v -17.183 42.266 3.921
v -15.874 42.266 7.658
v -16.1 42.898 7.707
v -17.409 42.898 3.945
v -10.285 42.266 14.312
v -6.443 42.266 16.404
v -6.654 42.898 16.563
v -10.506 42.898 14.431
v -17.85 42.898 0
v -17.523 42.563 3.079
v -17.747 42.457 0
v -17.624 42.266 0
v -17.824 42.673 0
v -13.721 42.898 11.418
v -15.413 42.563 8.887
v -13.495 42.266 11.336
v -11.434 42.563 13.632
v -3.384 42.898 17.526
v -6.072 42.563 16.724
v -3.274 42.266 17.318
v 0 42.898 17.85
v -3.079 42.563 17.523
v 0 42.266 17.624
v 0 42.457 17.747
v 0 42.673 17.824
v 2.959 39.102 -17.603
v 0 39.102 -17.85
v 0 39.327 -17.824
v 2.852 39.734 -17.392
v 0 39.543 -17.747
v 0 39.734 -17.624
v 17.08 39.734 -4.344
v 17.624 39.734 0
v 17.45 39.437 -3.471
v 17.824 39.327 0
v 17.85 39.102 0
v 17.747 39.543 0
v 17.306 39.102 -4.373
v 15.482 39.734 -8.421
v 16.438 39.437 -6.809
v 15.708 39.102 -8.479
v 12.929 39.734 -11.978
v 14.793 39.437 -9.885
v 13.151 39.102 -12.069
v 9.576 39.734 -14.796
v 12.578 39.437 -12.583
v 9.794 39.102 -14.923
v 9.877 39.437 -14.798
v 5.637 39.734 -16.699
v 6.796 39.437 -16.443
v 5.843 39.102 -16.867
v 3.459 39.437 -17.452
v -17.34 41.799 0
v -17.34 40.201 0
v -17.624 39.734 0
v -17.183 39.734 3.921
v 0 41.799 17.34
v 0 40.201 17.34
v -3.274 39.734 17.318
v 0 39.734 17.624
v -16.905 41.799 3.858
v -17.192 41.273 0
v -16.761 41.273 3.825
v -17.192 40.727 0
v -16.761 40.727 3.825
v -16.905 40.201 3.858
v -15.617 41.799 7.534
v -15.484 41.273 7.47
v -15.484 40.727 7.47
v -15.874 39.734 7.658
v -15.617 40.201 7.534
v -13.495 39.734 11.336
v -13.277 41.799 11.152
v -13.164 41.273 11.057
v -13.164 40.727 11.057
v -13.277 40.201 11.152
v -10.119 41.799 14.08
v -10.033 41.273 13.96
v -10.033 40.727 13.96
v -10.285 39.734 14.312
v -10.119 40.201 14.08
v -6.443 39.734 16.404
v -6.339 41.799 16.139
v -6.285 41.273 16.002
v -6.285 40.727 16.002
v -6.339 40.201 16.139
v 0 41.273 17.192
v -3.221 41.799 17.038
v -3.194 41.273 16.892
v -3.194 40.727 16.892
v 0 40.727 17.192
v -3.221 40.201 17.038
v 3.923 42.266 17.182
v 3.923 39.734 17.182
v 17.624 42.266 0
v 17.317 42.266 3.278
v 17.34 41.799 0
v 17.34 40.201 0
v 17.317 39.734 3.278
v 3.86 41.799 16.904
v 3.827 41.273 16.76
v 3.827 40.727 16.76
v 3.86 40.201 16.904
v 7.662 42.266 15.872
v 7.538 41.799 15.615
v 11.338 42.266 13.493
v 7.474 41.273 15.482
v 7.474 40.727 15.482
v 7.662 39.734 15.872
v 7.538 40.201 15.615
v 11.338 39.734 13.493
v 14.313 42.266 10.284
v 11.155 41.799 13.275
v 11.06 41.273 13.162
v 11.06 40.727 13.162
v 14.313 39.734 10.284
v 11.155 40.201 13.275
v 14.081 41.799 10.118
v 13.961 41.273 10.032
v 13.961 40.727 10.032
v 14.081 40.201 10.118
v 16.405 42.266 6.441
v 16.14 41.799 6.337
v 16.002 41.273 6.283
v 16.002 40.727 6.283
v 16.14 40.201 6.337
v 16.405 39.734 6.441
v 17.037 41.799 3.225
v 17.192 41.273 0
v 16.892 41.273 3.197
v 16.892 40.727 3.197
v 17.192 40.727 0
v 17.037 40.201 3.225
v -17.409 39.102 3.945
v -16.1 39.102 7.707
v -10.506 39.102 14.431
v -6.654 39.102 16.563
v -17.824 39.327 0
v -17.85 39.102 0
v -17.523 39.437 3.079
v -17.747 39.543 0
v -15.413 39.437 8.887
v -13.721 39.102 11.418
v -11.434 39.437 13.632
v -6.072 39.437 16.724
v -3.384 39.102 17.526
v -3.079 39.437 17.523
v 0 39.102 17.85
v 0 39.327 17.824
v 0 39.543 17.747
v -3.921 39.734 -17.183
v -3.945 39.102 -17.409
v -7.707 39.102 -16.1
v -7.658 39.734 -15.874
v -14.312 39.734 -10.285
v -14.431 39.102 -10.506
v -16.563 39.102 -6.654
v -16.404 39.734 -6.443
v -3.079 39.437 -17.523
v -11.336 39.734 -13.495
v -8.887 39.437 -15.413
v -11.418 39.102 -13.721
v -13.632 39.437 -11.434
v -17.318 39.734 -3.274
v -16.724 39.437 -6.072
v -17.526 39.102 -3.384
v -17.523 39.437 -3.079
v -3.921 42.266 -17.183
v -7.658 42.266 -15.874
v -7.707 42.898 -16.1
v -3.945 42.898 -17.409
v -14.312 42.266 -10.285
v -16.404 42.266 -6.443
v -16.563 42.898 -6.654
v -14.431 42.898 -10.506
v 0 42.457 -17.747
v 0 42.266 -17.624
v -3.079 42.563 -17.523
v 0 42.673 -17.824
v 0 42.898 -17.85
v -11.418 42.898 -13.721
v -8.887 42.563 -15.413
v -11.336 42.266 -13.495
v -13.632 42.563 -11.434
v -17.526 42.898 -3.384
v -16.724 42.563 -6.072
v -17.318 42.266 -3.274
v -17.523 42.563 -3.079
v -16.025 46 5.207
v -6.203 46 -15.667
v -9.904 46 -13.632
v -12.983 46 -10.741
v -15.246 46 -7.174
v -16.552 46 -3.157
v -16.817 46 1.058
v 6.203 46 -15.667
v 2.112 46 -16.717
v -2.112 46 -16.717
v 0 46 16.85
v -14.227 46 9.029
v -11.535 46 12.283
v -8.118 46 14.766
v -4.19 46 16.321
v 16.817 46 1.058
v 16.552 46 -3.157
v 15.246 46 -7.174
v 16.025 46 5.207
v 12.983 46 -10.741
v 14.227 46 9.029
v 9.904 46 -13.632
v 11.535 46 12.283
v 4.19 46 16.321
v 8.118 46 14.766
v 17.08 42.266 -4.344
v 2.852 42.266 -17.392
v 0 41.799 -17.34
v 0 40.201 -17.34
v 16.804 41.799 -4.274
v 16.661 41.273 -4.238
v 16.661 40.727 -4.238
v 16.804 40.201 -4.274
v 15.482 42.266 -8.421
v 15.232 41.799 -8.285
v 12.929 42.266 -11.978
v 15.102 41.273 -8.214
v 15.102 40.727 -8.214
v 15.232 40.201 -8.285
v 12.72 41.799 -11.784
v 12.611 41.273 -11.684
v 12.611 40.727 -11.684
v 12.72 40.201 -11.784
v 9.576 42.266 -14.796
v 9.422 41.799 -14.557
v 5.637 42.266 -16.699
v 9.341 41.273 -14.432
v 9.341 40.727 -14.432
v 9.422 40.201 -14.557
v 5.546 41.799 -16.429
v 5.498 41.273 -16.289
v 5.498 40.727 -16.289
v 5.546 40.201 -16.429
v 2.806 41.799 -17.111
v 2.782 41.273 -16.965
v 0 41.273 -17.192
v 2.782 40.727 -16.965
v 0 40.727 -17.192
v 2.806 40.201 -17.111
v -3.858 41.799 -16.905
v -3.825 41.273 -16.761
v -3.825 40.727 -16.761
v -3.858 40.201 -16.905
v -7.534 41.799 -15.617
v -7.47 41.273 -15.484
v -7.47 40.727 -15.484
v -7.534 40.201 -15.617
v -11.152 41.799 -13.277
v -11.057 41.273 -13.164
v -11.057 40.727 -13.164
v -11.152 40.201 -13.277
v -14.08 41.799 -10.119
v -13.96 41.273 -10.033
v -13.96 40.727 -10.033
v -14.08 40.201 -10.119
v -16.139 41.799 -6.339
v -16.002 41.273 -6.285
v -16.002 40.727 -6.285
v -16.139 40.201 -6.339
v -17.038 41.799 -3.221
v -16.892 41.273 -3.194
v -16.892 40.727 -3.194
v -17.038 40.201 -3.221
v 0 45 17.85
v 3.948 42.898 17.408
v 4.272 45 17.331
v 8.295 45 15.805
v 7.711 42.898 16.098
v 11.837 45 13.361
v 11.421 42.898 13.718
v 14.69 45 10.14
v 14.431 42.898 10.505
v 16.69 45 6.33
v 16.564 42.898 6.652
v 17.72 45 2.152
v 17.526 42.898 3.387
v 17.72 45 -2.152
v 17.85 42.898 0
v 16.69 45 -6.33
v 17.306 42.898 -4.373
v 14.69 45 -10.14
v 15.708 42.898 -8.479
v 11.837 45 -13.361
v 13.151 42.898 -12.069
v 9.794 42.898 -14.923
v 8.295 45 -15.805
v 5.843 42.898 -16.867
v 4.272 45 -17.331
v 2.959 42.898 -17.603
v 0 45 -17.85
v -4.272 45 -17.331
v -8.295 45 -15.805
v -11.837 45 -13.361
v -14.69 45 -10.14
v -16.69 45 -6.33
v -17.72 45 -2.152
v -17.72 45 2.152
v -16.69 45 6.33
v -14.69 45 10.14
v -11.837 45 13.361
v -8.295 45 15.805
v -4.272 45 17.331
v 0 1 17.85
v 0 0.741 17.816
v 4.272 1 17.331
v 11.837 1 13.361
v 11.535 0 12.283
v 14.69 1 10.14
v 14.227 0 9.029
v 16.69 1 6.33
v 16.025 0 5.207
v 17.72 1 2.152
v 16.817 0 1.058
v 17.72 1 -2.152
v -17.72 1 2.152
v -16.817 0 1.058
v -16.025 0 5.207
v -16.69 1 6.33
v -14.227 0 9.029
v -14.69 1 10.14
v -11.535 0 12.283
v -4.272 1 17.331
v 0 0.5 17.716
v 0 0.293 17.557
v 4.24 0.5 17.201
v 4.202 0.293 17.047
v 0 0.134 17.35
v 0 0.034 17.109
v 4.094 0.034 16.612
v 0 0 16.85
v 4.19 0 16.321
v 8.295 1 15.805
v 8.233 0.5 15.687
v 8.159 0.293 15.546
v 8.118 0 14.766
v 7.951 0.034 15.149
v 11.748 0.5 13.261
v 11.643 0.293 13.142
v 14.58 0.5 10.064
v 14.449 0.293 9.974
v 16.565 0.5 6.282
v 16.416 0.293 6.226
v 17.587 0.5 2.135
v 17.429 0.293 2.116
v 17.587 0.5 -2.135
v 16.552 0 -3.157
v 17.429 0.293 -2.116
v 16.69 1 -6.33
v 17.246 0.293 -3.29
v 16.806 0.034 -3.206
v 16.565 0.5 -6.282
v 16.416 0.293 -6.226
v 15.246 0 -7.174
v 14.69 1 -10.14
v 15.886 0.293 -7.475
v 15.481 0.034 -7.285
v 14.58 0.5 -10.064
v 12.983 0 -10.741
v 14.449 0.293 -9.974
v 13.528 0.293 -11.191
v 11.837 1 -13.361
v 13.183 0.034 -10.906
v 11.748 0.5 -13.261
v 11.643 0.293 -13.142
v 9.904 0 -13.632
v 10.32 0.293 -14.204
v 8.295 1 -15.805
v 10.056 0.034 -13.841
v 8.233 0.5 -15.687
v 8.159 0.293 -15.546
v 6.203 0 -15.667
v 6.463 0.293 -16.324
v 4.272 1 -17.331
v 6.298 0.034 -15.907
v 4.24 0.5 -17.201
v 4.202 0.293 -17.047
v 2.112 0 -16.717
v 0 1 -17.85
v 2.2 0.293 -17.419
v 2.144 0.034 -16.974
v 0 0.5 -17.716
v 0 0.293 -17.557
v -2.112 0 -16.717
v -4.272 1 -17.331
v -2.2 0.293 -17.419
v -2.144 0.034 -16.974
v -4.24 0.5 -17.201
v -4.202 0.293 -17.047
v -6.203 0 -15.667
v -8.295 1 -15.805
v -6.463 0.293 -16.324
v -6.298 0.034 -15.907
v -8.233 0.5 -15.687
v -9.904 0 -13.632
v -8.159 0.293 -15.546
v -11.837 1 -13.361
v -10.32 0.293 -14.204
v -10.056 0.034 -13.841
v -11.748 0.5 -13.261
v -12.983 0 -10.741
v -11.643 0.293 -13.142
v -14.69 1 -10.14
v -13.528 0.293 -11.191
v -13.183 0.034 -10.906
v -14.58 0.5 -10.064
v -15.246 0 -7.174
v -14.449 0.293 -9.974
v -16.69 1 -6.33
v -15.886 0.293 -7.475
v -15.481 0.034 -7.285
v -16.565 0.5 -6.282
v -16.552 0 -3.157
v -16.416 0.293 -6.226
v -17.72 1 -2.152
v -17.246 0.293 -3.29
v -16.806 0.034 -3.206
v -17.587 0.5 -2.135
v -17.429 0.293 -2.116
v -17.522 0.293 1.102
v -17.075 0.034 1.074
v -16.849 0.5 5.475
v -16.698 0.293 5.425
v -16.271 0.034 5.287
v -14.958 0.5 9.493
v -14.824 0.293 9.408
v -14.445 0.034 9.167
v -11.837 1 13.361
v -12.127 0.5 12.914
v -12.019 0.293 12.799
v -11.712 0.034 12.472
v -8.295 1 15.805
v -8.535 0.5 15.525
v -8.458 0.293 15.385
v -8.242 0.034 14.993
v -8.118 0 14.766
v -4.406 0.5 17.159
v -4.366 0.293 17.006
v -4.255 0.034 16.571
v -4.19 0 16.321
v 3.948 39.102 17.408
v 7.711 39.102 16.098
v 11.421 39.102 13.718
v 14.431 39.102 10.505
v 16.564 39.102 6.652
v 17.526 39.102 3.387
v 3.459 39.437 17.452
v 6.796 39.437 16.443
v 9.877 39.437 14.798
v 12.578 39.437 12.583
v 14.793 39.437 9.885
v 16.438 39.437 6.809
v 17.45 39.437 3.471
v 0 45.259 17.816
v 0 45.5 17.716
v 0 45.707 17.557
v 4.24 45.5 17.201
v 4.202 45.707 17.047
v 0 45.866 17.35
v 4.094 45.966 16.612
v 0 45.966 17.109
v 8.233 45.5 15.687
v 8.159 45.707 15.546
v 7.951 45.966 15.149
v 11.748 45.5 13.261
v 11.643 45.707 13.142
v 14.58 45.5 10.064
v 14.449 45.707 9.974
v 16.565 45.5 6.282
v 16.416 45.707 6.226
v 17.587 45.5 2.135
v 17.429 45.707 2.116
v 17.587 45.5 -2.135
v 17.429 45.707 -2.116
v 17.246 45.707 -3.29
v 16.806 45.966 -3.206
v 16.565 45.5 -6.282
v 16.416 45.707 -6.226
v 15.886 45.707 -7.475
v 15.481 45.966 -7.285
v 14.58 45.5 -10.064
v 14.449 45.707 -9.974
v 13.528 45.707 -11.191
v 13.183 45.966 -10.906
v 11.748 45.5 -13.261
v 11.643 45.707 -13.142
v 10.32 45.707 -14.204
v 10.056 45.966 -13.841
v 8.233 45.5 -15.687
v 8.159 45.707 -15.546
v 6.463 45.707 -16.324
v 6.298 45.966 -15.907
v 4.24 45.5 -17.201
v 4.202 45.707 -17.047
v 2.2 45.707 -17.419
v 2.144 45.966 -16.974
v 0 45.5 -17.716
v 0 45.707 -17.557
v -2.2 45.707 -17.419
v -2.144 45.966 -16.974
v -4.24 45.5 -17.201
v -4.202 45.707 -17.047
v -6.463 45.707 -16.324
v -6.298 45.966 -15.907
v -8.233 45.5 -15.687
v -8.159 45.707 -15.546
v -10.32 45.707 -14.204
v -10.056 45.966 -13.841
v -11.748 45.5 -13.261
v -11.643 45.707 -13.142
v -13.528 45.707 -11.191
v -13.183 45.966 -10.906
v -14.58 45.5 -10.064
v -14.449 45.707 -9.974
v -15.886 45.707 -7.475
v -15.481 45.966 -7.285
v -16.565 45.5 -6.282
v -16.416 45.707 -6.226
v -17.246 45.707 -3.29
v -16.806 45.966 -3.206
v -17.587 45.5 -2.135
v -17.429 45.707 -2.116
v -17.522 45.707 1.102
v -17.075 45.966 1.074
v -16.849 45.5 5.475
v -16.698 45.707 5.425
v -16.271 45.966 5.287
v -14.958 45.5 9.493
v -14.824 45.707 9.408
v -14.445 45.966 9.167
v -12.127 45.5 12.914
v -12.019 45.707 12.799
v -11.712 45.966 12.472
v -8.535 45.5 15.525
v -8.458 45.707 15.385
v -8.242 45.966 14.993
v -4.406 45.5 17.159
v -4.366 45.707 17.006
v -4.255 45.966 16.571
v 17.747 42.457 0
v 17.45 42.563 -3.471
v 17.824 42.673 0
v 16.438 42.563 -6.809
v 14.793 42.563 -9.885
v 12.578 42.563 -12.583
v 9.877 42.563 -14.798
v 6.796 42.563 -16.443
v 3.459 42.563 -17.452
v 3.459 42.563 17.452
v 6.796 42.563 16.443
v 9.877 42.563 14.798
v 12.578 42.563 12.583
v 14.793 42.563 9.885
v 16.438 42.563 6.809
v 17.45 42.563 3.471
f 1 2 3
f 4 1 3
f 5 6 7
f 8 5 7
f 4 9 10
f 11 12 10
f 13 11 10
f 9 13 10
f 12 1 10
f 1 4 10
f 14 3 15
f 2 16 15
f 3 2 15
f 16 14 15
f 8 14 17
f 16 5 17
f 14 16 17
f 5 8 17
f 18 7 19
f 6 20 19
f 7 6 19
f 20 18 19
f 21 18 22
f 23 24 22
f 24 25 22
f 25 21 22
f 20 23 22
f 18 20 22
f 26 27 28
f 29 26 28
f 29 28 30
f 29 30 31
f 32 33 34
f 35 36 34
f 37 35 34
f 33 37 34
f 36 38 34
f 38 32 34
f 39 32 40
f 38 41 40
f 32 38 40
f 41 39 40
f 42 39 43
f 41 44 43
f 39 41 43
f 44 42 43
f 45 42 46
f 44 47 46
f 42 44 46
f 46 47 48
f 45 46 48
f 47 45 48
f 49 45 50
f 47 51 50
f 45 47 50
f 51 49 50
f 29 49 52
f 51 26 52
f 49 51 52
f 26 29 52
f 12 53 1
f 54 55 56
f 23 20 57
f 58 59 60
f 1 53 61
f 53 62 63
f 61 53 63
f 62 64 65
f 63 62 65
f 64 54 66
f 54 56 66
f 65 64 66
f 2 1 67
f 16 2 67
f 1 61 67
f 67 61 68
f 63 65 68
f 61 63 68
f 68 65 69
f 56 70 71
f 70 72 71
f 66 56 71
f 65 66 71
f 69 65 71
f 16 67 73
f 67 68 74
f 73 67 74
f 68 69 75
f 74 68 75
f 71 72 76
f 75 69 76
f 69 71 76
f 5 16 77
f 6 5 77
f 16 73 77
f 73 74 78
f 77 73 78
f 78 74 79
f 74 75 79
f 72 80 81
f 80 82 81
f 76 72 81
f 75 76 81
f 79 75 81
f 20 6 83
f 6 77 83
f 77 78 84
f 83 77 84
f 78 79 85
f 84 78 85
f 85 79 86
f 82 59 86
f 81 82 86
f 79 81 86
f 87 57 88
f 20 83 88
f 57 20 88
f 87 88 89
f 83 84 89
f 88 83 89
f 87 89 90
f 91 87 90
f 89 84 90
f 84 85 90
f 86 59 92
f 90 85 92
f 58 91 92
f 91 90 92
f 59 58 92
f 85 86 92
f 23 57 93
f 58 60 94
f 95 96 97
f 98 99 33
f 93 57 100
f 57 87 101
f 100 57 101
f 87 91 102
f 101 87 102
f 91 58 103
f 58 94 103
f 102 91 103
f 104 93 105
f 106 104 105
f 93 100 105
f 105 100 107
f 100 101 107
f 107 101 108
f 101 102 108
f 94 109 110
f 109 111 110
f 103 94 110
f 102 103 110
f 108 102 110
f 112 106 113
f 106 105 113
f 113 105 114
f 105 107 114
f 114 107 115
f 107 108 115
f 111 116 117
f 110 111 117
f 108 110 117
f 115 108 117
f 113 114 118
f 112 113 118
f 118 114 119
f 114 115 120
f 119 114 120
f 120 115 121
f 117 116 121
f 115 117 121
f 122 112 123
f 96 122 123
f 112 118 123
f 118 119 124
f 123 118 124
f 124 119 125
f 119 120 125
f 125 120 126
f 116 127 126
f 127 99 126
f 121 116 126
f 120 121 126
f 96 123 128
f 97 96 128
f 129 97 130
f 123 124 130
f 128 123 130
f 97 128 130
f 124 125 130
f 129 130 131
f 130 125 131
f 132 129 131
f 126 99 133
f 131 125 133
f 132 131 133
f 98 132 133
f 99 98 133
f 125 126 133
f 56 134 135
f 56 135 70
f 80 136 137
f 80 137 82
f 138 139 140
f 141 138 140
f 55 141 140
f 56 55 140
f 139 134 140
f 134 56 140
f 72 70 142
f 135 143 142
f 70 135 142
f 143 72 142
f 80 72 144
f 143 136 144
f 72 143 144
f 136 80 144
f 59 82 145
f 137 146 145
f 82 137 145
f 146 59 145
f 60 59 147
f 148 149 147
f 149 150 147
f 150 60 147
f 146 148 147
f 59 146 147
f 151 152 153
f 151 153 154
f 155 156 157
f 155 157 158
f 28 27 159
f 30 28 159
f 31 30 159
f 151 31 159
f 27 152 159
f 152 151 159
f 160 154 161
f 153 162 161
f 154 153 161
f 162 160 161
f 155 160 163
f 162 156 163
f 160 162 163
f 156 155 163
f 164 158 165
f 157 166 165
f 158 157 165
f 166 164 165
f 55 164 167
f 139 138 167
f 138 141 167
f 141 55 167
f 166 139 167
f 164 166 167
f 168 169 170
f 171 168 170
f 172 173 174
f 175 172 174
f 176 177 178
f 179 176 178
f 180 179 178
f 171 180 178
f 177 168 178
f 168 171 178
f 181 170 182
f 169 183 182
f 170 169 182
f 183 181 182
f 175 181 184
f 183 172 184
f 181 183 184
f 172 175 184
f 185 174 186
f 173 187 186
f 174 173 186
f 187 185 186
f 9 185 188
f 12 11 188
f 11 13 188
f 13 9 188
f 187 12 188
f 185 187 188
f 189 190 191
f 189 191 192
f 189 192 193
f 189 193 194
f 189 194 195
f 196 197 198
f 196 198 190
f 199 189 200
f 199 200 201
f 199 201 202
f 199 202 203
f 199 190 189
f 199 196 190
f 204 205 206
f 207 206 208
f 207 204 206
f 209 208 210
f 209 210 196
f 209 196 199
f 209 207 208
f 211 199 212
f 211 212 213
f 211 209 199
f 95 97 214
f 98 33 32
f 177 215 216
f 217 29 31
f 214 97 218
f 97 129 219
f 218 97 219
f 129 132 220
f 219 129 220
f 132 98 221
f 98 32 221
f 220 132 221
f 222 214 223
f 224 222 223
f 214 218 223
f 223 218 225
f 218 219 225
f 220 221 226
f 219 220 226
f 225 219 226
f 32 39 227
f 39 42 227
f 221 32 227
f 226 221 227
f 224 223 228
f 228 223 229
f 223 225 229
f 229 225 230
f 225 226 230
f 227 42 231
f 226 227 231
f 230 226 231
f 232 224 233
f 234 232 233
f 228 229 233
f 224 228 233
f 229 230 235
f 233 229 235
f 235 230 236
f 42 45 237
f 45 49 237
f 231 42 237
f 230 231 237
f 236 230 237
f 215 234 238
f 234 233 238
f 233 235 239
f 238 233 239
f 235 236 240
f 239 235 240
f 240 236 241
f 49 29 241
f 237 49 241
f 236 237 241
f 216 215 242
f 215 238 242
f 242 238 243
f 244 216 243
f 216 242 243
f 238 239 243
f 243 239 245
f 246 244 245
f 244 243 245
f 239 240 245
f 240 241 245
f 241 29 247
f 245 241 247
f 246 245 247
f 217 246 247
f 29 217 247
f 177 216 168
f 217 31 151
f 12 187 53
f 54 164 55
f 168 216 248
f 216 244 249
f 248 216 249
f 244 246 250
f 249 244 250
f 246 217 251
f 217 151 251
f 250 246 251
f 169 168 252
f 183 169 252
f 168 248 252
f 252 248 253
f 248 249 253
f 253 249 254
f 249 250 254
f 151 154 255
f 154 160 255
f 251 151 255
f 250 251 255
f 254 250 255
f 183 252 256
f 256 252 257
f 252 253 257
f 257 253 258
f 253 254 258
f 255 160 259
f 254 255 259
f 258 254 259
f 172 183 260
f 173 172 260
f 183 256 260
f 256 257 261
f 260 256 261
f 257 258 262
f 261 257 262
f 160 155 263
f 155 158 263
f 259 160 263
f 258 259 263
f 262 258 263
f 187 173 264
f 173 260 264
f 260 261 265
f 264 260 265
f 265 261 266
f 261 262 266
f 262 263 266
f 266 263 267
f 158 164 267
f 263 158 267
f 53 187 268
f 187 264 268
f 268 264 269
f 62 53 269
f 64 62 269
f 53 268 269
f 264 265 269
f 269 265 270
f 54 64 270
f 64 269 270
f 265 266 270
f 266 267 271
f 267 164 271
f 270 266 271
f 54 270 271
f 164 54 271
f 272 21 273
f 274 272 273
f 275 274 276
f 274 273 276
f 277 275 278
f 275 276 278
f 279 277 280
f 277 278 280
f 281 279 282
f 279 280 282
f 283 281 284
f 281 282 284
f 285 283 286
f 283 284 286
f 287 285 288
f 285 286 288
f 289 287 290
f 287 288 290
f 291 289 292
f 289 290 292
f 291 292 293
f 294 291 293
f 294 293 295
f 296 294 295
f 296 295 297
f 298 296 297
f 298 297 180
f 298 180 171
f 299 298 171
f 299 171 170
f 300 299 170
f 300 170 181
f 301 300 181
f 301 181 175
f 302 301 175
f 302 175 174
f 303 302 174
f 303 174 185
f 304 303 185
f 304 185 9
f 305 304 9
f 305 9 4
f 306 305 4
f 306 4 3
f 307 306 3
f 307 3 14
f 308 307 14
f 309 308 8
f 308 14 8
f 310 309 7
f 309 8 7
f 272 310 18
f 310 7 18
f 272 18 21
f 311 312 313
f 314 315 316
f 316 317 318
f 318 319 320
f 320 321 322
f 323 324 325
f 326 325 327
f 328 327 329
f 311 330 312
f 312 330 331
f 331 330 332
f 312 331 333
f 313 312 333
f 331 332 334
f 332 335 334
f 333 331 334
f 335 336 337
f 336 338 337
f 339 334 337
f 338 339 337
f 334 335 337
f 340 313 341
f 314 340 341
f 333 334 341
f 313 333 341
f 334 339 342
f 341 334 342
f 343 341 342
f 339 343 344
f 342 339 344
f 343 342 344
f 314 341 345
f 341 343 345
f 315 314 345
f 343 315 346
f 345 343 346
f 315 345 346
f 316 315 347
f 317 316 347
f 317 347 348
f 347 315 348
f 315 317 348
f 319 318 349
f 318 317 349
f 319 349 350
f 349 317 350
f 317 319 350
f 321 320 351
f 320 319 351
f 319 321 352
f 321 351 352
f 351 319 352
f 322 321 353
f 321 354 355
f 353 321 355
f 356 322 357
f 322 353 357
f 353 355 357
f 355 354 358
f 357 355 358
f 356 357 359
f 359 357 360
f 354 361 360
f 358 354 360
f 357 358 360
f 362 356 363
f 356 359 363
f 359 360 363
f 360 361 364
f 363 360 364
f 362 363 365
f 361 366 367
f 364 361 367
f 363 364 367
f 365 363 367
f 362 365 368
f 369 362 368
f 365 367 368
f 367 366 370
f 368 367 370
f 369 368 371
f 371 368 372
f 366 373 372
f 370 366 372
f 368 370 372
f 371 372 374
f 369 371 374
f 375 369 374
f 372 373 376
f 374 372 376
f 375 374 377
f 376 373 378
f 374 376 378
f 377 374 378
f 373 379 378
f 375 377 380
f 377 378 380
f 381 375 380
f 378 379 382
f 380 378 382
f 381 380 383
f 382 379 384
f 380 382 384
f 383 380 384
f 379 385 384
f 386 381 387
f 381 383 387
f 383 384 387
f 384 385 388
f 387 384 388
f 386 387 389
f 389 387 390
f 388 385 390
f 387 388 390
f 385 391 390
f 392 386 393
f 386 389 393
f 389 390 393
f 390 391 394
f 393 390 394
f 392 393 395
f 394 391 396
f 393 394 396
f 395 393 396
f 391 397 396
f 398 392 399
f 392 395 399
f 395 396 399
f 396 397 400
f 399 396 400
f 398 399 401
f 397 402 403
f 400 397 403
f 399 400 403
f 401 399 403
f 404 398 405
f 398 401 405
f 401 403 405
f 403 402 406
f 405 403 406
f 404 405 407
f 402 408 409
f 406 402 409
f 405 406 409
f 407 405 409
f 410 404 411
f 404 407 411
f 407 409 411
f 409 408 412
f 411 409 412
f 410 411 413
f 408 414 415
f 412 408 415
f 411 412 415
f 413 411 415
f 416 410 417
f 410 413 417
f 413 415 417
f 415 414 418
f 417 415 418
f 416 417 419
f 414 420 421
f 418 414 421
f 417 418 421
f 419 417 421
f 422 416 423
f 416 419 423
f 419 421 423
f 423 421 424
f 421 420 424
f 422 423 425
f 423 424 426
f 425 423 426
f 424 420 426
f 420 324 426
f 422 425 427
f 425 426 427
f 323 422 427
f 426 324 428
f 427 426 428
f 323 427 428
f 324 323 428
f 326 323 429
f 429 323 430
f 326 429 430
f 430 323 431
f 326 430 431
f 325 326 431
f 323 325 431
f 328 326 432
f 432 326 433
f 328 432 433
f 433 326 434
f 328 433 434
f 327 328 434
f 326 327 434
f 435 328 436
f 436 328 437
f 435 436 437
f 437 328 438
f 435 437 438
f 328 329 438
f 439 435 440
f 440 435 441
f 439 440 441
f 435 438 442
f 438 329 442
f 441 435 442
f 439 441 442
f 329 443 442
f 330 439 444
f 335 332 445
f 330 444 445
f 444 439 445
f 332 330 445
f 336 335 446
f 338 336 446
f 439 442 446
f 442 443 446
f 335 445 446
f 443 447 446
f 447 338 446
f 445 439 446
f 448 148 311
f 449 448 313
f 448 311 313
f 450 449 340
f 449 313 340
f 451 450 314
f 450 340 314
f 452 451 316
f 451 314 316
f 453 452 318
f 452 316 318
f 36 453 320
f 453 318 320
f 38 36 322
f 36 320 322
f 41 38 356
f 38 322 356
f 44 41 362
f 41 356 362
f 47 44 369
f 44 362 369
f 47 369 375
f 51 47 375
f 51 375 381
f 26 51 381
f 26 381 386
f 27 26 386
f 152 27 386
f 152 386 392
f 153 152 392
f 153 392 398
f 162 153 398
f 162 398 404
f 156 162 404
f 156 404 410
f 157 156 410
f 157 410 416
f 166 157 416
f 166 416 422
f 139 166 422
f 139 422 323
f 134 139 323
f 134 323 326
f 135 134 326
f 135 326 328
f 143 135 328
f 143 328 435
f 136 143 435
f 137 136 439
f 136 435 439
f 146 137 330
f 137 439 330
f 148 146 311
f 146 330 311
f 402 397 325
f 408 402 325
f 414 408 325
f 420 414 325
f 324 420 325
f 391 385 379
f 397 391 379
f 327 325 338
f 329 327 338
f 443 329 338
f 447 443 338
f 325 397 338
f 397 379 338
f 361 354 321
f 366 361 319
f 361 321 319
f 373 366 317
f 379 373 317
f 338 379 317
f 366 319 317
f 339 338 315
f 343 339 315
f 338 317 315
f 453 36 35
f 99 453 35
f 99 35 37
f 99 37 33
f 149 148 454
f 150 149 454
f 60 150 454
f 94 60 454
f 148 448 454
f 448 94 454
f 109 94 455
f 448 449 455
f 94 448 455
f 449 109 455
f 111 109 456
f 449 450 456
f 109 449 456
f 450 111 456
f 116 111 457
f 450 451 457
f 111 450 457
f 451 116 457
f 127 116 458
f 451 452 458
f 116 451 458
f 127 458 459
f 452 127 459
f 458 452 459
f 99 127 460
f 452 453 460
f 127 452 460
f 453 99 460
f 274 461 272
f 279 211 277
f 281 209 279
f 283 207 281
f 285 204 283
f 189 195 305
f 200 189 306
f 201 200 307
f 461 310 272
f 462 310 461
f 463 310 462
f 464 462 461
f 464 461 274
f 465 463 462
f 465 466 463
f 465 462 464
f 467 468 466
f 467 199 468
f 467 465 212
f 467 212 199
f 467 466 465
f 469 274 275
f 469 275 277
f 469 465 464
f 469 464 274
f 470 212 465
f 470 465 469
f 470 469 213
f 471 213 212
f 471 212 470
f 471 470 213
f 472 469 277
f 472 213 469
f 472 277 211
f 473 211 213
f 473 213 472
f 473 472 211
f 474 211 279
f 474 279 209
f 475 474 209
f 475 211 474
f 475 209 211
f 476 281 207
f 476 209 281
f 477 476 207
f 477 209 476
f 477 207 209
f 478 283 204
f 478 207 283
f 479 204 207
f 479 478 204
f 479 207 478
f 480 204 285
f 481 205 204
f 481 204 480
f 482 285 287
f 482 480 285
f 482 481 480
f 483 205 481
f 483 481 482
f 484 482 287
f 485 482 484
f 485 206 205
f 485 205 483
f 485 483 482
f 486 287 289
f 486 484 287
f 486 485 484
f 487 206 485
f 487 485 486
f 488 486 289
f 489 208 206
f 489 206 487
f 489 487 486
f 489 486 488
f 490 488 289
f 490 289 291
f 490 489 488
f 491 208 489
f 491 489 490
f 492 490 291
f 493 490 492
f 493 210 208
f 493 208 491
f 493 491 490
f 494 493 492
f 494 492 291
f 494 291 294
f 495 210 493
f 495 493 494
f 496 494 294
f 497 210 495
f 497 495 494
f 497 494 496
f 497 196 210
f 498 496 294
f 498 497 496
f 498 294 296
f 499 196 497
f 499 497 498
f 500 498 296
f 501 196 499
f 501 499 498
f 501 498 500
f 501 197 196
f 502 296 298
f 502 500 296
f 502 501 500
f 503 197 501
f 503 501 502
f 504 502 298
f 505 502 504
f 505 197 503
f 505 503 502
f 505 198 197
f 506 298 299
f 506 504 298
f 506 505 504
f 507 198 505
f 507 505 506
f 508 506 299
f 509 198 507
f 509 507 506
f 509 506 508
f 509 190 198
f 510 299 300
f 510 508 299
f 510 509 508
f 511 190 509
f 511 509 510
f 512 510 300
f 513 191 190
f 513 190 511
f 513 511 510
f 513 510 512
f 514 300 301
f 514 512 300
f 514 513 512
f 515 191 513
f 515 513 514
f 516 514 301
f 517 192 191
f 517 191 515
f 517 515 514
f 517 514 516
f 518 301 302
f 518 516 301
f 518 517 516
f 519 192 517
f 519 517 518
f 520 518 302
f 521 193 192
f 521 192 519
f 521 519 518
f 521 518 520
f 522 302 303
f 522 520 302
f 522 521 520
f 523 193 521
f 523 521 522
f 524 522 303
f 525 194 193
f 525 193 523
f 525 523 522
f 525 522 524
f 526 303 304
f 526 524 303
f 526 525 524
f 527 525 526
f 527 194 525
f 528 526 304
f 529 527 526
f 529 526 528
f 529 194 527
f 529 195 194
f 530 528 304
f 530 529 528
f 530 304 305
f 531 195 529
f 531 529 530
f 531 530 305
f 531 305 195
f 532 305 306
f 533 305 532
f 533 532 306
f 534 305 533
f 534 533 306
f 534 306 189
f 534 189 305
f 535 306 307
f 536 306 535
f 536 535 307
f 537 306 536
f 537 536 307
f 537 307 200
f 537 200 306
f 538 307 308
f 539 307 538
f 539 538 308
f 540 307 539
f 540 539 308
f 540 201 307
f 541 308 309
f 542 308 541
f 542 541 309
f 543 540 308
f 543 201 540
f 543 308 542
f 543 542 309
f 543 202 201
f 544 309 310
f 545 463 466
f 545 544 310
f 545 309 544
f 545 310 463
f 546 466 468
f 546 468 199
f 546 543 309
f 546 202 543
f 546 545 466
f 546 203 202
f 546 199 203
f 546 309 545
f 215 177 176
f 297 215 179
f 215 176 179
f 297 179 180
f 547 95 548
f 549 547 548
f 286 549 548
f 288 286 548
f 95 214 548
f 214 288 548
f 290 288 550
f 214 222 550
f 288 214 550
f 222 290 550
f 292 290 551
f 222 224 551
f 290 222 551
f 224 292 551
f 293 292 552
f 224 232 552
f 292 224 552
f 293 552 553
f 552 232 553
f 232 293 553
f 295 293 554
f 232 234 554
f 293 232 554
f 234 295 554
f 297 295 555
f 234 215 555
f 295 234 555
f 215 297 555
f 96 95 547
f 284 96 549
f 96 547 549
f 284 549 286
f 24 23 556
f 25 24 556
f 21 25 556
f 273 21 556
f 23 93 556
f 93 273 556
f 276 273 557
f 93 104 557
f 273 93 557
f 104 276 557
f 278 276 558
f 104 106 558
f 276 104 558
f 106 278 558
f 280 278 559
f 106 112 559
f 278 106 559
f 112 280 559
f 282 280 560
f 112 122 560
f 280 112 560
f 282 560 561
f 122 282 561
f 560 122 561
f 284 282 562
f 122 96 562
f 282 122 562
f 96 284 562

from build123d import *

# Parameters (mm, degrees)
ESBO_O1_R                = 17.85
RESSALTO_EXTRUS_O1_DEPTH = 46
FILETE1_R                = 1
FILETE2_R                = 1


with BuildPart() as part:
    # Esboço1 → Ressalto-extrusão1 (new body)
    with BuildSketch(Plane(origin=(0, 0, 0), x_dir=(1, 0, 0), z_dir=(0, 1, 0))):
        with Locations(Location((0, 0, 0), (0, 0, 270))):
            Circle(ESBO_O1_R)
    extrude(amount=RESSALTO_EXTRUS_O1_DEPTH)

    # Varredura de corte1: sweep along a curve in space
    with BuildLine() as varredura_de_corte1_path:
        ThreePointArc((0, 46, 17.85), (12.621856044, 46, 12.621856044), (17.85, 46, 0))
        ThreePointArc((17.85, 46, 0), (12.621856044, 46, -12.621856044), (0, 46, -17.85))
        ThreePointArc((0, 46, -17.85), (-12.621856044, 46, -12.621856044), (-17.85, 46, 0))
        ThreePointArc((-17.85, 46, 0), (-12.621856044, 46, 12.621856044), (0, 46, 17.85))
    # Esboço2 → Varredura de corte1 (sweep, cut)
    with BuildSketch(Plane.XY):
        with BuildLine():
            Line((17.85, 42.5), (17.85, 39.5))
            ThreePointArc((17.85, 39.5), (17.172875656, 41), (17.85, 42.5))
        make_face()
    sweep(path=varredura_de_corte1_path.line, mode=Mode.SUBTRACT)

    # Filete1
    filete1_edges = [part.edges().sort_by_distance(p)[0] for p in [
        (0, 0, -17.85),
        (0, 46, -17.85),
    ]]
    fillet(filete1_edges, radius=FILETE1_R)

    # Filete2
    filete2_edges = [part.edges().sort_by_distance(p)[0] for p in [
        (12.621856044, 39.5, -12.621856044),
        (12.621856044, 42.5, -12.621856044),
    ]]
    fillet(filete2_edges, radius=FILETE2_R)


solid = part.part
